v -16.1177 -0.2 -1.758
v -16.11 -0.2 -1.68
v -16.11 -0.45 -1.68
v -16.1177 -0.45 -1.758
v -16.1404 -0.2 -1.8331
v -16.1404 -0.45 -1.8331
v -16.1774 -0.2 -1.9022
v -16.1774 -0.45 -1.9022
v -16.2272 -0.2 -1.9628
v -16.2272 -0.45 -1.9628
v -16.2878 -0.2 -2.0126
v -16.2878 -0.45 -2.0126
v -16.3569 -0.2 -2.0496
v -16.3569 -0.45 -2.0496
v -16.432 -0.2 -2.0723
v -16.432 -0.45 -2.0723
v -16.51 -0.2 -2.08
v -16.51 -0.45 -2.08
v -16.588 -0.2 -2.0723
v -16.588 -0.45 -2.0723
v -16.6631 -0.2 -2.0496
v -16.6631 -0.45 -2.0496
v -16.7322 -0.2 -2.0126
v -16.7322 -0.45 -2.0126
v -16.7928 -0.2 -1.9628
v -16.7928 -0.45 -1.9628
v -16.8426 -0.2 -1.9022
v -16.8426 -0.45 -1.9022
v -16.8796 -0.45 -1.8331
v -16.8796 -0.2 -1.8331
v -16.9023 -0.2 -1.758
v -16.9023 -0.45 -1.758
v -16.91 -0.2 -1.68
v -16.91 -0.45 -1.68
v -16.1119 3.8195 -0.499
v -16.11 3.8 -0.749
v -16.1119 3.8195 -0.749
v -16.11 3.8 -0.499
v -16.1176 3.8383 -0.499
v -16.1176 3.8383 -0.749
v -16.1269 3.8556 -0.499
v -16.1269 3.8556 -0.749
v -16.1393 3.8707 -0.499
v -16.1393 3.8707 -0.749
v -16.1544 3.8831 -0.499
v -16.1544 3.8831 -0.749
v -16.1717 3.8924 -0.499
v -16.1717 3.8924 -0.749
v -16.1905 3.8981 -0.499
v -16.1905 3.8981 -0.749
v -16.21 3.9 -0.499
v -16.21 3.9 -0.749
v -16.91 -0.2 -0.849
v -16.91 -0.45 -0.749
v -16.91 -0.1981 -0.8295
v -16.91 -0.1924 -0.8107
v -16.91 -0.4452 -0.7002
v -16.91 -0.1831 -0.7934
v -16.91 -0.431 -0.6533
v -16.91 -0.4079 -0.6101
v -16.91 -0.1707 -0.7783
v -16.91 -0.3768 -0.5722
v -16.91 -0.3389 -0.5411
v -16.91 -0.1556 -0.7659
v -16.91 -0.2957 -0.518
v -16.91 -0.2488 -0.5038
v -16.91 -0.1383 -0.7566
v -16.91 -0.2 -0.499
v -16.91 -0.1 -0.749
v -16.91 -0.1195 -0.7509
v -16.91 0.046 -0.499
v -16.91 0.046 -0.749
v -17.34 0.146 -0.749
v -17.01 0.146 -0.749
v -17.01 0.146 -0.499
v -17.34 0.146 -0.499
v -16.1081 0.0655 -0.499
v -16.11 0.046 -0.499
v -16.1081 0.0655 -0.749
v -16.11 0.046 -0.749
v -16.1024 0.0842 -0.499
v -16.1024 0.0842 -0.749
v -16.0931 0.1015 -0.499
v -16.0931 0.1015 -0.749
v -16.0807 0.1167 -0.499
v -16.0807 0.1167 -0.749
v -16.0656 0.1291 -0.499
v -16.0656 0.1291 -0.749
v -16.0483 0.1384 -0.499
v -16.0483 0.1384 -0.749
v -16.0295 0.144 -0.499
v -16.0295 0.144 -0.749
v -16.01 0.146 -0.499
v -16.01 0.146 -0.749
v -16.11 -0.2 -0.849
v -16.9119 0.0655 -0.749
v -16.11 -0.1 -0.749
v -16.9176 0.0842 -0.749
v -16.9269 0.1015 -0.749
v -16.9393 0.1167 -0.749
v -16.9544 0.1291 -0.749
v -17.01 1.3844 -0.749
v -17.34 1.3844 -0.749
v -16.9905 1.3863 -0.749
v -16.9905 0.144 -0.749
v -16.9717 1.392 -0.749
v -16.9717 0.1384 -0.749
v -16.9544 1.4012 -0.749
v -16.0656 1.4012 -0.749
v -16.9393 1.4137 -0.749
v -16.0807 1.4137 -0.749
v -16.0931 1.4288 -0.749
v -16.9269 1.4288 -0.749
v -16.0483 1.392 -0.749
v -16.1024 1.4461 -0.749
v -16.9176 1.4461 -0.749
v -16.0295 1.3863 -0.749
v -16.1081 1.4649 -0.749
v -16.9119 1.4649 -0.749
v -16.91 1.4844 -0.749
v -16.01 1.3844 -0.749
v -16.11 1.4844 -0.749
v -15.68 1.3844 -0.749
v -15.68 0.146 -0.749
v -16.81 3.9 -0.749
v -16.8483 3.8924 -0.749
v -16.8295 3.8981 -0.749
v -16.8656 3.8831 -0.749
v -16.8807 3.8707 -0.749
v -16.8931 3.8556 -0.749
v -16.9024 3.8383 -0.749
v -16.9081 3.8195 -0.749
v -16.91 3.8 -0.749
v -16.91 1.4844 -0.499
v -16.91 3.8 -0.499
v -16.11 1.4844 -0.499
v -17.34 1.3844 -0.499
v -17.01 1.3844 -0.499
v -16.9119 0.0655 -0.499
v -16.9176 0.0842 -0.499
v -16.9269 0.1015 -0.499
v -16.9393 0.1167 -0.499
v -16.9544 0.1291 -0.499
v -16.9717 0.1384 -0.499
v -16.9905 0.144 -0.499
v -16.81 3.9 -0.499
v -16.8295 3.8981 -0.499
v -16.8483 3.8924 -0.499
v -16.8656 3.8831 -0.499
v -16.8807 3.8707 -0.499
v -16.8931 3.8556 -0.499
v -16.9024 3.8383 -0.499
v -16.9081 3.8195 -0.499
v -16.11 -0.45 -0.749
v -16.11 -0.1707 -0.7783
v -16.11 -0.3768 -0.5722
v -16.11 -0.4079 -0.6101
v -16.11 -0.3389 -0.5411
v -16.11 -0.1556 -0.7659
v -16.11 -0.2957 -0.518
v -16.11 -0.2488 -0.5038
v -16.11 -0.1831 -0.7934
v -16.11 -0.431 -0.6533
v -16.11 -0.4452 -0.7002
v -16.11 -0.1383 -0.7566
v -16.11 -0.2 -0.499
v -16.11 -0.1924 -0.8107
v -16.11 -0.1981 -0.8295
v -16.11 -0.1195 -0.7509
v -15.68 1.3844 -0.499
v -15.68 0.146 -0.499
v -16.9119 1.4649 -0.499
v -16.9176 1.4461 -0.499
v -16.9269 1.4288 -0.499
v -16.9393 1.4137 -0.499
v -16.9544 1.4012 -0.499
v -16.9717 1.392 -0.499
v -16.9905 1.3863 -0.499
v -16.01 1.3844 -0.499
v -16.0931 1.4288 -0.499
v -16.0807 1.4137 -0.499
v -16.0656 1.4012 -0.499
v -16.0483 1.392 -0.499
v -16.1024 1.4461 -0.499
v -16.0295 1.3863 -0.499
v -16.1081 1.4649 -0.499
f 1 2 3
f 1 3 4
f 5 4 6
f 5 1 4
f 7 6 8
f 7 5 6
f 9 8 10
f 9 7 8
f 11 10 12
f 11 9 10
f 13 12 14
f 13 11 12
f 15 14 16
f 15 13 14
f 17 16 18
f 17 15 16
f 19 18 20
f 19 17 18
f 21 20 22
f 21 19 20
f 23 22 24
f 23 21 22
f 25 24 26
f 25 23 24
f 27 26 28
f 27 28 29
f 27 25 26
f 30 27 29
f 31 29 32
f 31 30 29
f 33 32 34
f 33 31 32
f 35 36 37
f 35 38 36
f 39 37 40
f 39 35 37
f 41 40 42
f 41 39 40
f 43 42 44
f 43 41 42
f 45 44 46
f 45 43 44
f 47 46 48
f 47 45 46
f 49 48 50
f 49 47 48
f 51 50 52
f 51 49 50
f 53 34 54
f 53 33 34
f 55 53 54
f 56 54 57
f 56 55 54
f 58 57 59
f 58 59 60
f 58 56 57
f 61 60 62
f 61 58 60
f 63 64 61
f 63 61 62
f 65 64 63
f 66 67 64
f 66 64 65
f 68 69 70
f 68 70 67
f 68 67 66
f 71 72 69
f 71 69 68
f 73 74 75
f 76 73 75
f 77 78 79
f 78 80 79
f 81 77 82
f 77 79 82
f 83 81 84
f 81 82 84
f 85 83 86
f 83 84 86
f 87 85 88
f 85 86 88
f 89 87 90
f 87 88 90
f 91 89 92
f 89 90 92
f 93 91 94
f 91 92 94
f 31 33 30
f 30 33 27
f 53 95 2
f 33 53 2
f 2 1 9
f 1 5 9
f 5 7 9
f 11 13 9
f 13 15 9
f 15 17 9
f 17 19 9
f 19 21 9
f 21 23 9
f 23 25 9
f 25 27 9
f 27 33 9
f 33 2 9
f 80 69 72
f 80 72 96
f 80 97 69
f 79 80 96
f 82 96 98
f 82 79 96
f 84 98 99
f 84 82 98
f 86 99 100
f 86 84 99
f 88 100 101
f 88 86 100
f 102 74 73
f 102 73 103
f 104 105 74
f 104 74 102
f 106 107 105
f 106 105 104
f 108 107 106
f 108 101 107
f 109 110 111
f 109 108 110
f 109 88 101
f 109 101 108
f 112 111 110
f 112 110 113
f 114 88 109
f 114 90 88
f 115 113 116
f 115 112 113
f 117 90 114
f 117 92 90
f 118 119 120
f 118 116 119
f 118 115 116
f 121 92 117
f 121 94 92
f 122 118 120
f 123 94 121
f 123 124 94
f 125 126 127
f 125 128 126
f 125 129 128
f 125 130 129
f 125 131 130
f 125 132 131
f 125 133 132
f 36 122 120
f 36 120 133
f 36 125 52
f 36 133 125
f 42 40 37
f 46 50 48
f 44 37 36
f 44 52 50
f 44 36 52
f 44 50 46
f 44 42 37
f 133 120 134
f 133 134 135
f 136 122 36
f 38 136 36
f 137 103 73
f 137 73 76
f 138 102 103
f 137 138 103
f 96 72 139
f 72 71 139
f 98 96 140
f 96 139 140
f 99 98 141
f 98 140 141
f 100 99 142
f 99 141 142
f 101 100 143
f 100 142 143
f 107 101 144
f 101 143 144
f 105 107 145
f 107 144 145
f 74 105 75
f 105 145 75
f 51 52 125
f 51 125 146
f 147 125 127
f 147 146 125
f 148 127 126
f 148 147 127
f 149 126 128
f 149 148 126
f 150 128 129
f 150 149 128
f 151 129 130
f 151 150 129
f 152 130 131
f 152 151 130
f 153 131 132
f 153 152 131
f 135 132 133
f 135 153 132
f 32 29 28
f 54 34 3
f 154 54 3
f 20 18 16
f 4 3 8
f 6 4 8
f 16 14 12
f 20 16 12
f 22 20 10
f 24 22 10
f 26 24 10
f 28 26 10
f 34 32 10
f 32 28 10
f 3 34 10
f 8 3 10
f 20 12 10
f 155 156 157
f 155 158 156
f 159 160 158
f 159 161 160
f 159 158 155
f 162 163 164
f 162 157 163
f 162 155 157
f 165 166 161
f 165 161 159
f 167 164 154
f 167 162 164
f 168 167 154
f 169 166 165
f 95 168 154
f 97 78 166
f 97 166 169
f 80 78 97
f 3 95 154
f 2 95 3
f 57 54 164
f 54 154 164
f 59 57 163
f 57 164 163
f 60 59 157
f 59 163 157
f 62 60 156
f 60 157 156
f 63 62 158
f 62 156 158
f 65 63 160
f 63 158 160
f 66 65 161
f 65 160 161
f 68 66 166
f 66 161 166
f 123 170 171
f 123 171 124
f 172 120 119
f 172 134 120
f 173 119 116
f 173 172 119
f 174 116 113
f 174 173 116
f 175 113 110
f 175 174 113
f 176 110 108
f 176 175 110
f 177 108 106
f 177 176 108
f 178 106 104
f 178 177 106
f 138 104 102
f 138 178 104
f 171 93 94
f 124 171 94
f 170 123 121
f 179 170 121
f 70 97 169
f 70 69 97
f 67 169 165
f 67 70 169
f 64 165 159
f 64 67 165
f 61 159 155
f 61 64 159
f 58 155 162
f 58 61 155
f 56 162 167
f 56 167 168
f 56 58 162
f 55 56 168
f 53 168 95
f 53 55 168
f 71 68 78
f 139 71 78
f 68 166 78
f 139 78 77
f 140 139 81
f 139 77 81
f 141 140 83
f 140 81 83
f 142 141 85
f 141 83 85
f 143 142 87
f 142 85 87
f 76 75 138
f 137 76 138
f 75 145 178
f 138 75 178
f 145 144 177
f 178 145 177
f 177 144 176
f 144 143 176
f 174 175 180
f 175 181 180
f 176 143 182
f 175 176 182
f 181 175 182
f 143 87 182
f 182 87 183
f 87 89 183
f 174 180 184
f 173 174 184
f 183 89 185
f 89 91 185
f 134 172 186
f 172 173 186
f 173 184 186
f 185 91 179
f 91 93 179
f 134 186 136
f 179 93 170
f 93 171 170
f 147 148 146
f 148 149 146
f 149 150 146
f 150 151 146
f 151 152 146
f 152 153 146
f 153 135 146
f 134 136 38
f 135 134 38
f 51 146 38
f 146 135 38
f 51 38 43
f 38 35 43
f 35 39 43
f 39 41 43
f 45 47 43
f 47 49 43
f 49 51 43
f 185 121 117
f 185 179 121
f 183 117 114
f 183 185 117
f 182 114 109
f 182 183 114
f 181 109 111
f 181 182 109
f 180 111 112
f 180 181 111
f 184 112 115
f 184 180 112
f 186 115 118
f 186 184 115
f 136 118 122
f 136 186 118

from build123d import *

# Parameters (mm, degrees)
BOSS_EXTRUDE1_DEPTH = 4.35
SKETCH2_W           = 1.825069899
SKETCH2_H           = 4.1
CUT_EXTRUDE1_DEPTH  = 5.491814778
SKETCH3_W           = 0.25
SKETCH3_H           = 3.754034185
BOSS_EXTRUDE2_DEPTH = 0.43
SKETCH4_W           = 0.25
SKETCH4_H           = 3.754034185
BOSS_EXTRUDE3_DEPTH = 0.43
SKETCH5_W           = 0.43
SKETCH5_H           = 2.515624486
CUT_EXTRUDE2_DEPTH  = 18.82293918
SKETCH6_W           = 0.43
SKETCH6_H           = 2.515624486
CUT_EXTRUDE3_DEPTH  = 18.82293918
FILLET1_R           = 0.1
FILLET2_R           = 0.25


with BuildPart() as part:
    # Sketch1 → Boss-Extrude1 (new body)
    with BuildSketch(Plane(origin=(0, 3.9, 0), x_dir=(1, 0, 0), z_dir=(0, 1, 0))):
        with BuildLine():
            Line((-16.91, 0.499), (-16.11, 0.499))
            Line((-16.11, 0.499), (-16.11, 1.68))
            ThreePointArc((-16.11, 1.68), (-16.51, 2.08), (-16.91, 1.68))
            Line((-16.91, 1.68), (-16.91, 0.499))
        make_face()
    extrude(amount=-BOSS_EXTRUDE1_DEPTH)

    # Sketch2 → Cut-Extrude1 (cut, through all)
    with BuildSketch(Plane(origin=(-16.11, 0, 0), x_dir=(0, 0, -1), z_dir=(1, 0, 0))):
        with Locations((1.66153495, 1.85)):
            Rectangle(SKETCH2_W, SKETCH2_H)
    extrude(amount=-CUT_EXTRUDE1_DEPTH, mode=Mode.SUBTRACT)

    # Sketch3 → Boss-Extrude2 (add)
    with BuildSketch(Plane(origin=(-16.11, 0, 0), x_dir=(0, 0, -1), z_dir=(1, 0, 0))):
        with Locations((0.624, 2.022982908)):
            Rectangle(SKETCH3_W, SKETCH3_H)
    extrude(amount=BOSS_EXTRUDE2_DEPTH)

    # Sketch4 → Boss-Extrude3 (add)
    with BuildSketch(Plane.ZY.offset(16.91)):
        with Locations((-0.624, 2.022982908)):
            Rectangle(SKETCH4_W, SKETCH4_H)
    extrude(amount=BOSS_EXTRUDE3_DEPTH)

    # Sketch5 → Cut-Extrude2 (cut, through all)
    with BuildSketch(Plane(origin=(0, 0, -0.749), x_dir=(-1, 0, 0), z_dir=(0, 0, -1))):
        with Locations((15.895, 2.642187757)):
            Rectangle(SKETCH5_W, SKETCH5_H)
    extrude(amount=-CUT_EXTRUDE2_DEPTH, mode=Mode.SUBTRACT)

    # Sketch6 → Cut-Extrude3 (cut, through all)
    with BuildSketch(Plane(origin=(0, 0, -0.749), x_dir=(-1, 0, 0), z_dir=(0, 0, -1))):
        with Locations((17.125, 2.642187757)):
            Rectangle(SKETCH6_W, SKETCH6_H)
    extrude(amount=-CUT_EXTRUDE3_DEPTH, mode=Mode.SUBTRACT)

    # Fillet1
    fillet1_edges = [part.edges().sort_by_distance(p)[0] for p in [
        (-16.51, -0.2, -0.749),
        (-16.11, 0.145965815, -0.624),
        (-16.91, 0.145965815, -0.624),
        (-16.11, 3.9, -0.624),
        (-16.11, 1.384375514, -0.624),
        (-16.91, 1.384375514, -0.624),
        (-16.91, 3.9, -0.624),
    ]]
    fillet(fillet1_edges, radius=FILLET1_R)

    # Fillet2
    fillet2_edges = [part.edges().sort_by_distance(p)[0] for p in [
        (-16.51, -0.45, -0.499),
    ]]
    fillet(fillet2_edges, radius=FILLET2_R)


solid = part.part
